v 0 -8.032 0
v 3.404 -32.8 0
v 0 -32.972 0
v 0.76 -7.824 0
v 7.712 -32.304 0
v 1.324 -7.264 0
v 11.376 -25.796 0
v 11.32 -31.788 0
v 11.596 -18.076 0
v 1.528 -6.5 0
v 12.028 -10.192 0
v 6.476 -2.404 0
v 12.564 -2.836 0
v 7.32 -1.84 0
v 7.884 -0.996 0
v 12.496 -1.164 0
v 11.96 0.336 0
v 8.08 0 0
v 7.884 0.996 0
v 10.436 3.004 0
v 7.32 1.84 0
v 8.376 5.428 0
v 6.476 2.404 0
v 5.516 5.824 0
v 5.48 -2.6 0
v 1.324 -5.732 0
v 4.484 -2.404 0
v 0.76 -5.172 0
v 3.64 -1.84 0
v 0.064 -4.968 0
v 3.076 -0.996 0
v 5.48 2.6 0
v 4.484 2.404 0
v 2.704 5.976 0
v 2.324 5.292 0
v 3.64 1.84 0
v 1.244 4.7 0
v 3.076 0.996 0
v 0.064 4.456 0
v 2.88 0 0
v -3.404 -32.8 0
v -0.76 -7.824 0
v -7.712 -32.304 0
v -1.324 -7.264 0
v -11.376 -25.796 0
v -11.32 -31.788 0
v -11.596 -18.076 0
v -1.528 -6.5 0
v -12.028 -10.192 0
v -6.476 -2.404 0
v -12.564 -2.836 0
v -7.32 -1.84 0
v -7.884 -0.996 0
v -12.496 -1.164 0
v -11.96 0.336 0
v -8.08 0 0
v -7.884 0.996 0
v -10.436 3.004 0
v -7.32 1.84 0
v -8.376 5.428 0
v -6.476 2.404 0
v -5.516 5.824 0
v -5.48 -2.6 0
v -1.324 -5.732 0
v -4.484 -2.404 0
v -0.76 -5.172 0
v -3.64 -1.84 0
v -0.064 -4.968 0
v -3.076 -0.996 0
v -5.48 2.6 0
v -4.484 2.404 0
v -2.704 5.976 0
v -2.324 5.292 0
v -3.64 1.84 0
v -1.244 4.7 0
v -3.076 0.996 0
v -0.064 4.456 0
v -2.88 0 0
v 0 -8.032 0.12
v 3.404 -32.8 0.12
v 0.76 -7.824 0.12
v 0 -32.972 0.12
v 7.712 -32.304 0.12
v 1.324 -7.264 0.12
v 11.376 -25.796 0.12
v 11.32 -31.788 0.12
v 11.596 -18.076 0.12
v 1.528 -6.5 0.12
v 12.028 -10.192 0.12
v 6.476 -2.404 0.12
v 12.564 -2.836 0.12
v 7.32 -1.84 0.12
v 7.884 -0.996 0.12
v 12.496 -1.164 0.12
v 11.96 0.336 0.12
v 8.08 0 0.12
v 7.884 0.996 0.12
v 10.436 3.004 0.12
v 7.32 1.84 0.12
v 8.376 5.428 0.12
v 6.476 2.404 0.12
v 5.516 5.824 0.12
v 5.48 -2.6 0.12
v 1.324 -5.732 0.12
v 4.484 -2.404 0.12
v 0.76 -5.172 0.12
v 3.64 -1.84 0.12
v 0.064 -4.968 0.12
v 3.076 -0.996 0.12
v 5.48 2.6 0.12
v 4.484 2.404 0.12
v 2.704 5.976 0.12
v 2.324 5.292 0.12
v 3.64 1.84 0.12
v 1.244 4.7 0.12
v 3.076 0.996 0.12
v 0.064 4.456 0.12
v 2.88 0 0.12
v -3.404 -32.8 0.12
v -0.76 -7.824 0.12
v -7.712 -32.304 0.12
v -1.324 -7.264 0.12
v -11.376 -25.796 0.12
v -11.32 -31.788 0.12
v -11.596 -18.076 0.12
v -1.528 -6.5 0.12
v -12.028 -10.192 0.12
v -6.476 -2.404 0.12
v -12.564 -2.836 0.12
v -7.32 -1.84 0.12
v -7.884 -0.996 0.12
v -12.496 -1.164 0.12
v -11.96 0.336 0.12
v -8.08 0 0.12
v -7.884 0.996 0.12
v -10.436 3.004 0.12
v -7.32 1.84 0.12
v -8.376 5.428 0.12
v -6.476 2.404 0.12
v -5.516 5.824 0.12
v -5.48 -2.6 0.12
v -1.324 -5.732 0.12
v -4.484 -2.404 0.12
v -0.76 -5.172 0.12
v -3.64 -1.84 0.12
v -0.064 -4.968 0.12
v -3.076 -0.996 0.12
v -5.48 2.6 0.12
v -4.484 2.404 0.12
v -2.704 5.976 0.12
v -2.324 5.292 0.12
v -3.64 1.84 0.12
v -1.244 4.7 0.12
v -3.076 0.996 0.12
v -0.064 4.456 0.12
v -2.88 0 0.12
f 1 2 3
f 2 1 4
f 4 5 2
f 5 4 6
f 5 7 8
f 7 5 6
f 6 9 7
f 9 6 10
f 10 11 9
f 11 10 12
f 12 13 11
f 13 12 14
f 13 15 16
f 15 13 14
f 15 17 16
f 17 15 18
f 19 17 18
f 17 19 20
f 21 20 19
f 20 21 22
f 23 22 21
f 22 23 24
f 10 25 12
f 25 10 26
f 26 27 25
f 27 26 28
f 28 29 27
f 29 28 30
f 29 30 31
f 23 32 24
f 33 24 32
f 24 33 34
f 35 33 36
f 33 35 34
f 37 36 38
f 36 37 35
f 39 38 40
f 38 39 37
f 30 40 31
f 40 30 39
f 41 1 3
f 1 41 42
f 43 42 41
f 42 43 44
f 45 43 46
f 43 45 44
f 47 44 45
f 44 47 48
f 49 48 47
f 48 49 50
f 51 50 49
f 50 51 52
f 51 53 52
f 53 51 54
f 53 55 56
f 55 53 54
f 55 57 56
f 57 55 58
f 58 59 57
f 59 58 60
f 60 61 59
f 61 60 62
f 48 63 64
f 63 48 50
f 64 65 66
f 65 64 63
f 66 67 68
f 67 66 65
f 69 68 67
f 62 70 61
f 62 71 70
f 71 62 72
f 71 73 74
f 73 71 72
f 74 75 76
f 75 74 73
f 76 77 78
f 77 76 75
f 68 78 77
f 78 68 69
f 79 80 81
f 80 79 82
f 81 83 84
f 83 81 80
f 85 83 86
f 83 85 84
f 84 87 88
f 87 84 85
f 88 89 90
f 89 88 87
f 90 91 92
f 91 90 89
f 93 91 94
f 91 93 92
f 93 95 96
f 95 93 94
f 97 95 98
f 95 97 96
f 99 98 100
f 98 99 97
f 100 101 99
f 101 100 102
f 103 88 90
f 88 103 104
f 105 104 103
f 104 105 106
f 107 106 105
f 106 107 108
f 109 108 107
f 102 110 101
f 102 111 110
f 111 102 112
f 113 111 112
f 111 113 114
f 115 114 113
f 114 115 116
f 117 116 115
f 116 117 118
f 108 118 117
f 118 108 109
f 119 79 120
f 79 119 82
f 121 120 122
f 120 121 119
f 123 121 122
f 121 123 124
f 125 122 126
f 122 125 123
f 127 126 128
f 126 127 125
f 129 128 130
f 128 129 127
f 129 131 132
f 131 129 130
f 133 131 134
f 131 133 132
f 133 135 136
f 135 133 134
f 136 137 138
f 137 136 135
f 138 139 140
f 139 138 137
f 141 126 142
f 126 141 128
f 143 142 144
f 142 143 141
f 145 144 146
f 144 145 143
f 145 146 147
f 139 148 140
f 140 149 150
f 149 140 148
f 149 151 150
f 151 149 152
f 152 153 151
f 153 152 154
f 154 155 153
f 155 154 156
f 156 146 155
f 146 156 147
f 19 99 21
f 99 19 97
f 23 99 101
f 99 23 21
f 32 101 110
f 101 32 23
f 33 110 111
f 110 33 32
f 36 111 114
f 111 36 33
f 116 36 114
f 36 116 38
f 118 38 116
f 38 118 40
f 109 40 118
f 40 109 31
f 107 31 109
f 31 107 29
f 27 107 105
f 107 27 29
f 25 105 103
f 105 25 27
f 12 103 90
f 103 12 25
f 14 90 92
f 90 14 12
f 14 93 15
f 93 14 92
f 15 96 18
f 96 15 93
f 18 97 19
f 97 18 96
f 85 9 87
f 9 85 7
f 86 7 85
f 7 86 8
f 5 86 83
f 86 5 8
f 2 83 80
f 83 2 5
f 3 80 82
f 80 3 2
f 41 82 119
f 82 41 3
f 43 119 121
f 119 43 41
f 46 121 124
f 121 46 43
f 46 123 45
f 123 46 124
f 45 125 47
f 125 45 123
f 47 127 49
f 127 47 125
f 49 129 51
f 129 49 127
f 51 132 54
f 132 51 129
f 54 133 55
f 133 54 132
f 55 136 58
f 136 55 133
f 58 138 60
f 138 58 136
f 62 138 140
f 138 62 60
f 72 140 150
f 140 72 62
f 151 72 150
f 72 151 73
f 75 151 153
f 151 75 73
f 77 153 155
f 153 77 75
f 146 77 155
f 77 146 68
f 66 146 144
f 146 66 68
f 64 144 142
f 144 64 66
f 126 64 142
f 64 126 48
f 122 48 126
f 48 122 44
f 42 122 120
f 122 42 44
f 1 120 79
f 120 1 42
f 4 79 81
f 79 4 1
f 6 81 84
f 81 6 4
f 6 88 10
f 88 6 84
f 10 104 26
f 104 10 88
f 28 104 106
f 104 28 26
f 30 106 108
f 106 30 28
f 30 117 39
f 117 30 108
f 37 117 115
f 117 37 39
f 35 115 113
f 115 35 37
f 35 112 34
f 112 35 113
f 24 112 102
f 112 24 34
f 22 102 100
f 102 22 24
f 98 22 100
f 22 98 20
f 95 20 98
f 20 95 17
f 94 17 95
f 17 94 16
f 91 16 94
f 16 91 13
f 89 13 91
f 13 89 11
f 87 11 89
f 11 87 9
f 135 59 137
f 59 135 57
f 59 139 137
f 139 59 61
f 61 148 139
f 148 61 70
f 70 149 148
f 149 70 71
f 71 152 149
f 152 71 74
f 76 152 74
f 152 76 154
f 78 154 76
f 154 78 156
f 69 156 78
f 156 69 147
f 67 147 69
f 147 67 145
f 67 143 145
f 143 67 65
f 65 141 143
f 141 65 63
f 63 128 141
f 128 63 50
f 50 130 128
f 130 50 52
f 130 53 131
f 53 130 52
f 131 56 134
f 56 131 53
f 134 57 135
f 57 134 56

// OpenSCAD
// file: s/65384s01.scad
use <../../lib.scad>
function ldraw_lib__s__65384s01() = [
// 0 ~Minifig Cape Cloth with Straight Side Surface Half
// 0 Name: s\65384s01.dat
// 0 Author: Philippe Hurbain [Philo]
// 0 !LDRAW_ORG Subpart UPDATE 2023-04
// 0 !LICENSE Licensed under CC BY 4.0 : see CAreadme.txt
// 
// 0 BFC CERTIFY CCW
  [0,"BFC","CERTIFY"],
  [0,"BFC","CCW"],
// 
// 0 !HISTORY 2023-08-25 [OrionP] Official Update 2023-04
// 
// 
// 2 24 20.2 0 0 19.71 0 2.49
  [2,24,20.2,0,0,19.71,0,2.49],
// 2 24 19.71 0 2.49 18.3 0 4.6
  [2,24,19.71,0,2.49,18.3,0,4.6],
// 2 24 18.3 0 4.6 16.19 0 6.01
  [2,24,18.3,0,4.6,16.19,0,6.01],
// 2 24 16.19 0 6.01 13.7 0 6.5
  [2,24,16.19,0,6.01,13.7,0,6.5],
// 2 24 13.7 0 6.5 11.21 0 6.01
  [2,24,13.7,0,6.5,11.21,0,6.01],
// 2 24 11.21 0 6.01 9.1 0 4.6
  [2,24,11.21,0,6.01,9.1,0,4.6],
// 2 24 9.1 0 4.6 7.69 0 2.49
  [2,24,9.1,0,4.6,7.69,0,2.49],
// 2 24 7.69 0 2.49 7.2 0 0
  [2,24,7.69,0,2.49,7.2,0,0],
// 2 24 7.2 0 0 7.69 0 -2.49
  [2,24,7.2,0,0,7.69,0,-2.49],
// 2 24 7.69 0 -2.49 9.1 0 -4.6
  [2,24,7.69,0,-2.49,9.1,0,-4.6],
// 2 24 9.1 0 -4.6 11.21 0 -6.01
  [2,24,9.1,0,-4.6,11.21,0,-6.01],
// 2 24 11.21 0 -6.01 13.7 0 -6.5
  [2,24,11.21,0,-6.01,13.7,0,-6.5],
// 2 24 13.7 0 -6.5 16.19 0 -6.01
  [2,24,13.7,0,-6.5,16.19,0,-6.01],
// 2 24 16.19 0 -6.01 18.3 0 -4.6
  [2,24,16.19,0,-6.01,18.3,0,-4.6],
// 2 24 18.3 0 -4.6 19.71 0 -2.49
  [2,24,18.3,0,-4.6,19.71,0,-2.49],
// 2 24 19.71 0 -2.49 20.2 0 0
  [2,24,19.71,0,-2.49,20.2,0,0],
// 2 24 30.07 0 -25.48 28.99 0 -45.19
  [2,24,30.07,0,-25.48,28.99,0,-45.19],
// 2 24 3.11 0 11.75 5.81 0 13.23
  [2,24,3.11,0,11.75,5.81,0,13.23],
// 2 24 5.81 0 13.23 6.76 0 14.94
  [2,24,5.81,0,13.23,6.76,0,14.94],
// 2 24 6.76 0 14.94 13.79 0 14.56
  [2,24,6.76,0,14.94,13.79,0,14.56],
// 2 24 13.79 0 14.56 20.94 0 13.57
  [2,24,13.79,0,14.56,20.94,0,13.57],
// 2 24 20.94 0 13.57 26.09 0 7.51
  [2,24,20.94,0,13.57,26.09,0,7.51],
// 2 24 26.09 0 7.51 29.9 0 0.84
  [2,24,26.09,0,7.51,29.9,0,0.84],
// 2 24 29.9 0 0.84 31.24 0 -2.91
  [2,24,29.9,0,0.84,31.24,0,-2.91],
// 2 24 31.24 0 -2.91 31.41 0 -7.09
  [2,24,31.24,0,-2.91,31.41,0,-7.09],
// 2 24 31.41 0 -7.09 30.07 0 -25.48
  [2,24,31.41,0,-7.09,30.07,0,-25.48],
// 2 24 28.99 0 -45.19 28.44 0 -64.49
  [2,24,28.99,0,-45.19,28.44,0,-64.49],
// 2 24 28.44 0 -64.49 28.3 0 -79.47
  [2,24,28.44,0,-64.49,28.3,0,-79.47],
// 2 24 28.3 0 -79.47 19.28 0 -80.76
  [2,24,28.3,0,-79.47,19.28,0,-80.76],
// 2 24 19.28 0 -80.76 8.51 0 -82
  [2,24,19.28,0,-80.76,8.51,0,-82],
// 2 24 8.51 0 -82 0 0 -82.43
  [2,24,8.51,0,-82,0,0,-82.43],
// 2 24 1.9 0 -12.93 0.16 0 -12.42
  [2,24,1.9,0,-12.93,0.16,0,-12.42],
// 2 24 3.31 0 -14.33 1.9 0 -12.93
  [2,24,3.31,0,-14.33,1.9,0,-12.93],
// 2 24 3.82 0 -16.25 3.31 0 -14.33
  [2,24,3.82,0,-16.25,3.31,0,-14.33],
// 2 24 3.31 0 -18.16 3.82 0 -16.25
  [2,24,3.31,0,-18.16,3.82,0,-16.25],
// 2 24 1.9 0 -19.56 3.31 0 -18.16
  [2,24,1.9,0,-19.56,3.31,0,-18.16],
// 2 24 0 0 -20.08 1.9 0 -19.56
  [2,24,0,0,-20.08,1.9,0,-19.56],
// 2 24 0.16 0 -12.42 0.16 0 11.14
  [2,24,0.16,0,-12.42,0.16,0,11.14],
// 2 24 0.16 0 11.14 3.11 0 11.75
  [2,24,0.16,0,11.14,3.11,0,11.75],
// 4 16 1.9 0 -19.56 0 0 -20.08 0 0 -82.43 8.51 0 -82
  [4,16,1.9,0,-19.56,0,0,-20.08,0,0,-82.43,8.51,0,-82],
// 4 16 3.31 0 -18.16 1.9 0 -19.56 8.51 0 -82 19.28 0 -80.76
  [4,16,3.31,0,-18.16,1.9,0,-19.56,8.51,0,-82,19.28,0,-80.76],
// 4 16 3.31 0 -18.16 19.28 0 -80.76 28.3 0 -79.47 28.44 0 -64.49
  [4,16,3.31,0,-18.16,19.28,0,-80.76,28.3,0,-79.47,28.44,0,-64.49],
// 4 16 3.31 0 -18.16 28.44 0 -64.49 28.99 0 -45.19 3.82 0 -16.25
  [4,16,3.31,0,-18.16,28.44,0,-64.49,28.99,0,-45.19,3.82,0,-16.25],
// 4 16 28.99 0 -45.19 30.07 0 -25.48 16.19 0 -6.01 3.82 0 -16.25
  [4,16,28.99,0,-45.19,30.07,0,-25.48,16.19,0,-6.01,3.82,0,-16.25],
// 4 16 16.19 0 -6.01 30.07 0 -25.48 31.41 0 -7.09 18.3 0 -4.6
  [4,16,16.19,0,-6.01,30.07,0,-25.48,31.41,0,-7.09,18.3,0,-4.6],
// 4 16 31.24 0 -2.91 19.71 0 -2.49 18.3 0 -4.6 31.41 0 -7.09
  [4,16,31.24,0,-2.91,19.71,0,-2.49,18.3,0,-4.6,31.41,0,-7.09],
// 4 16 20.2 0 0 19.71 0 -2.49 31.24 0 -2.91 29.9 0 0.84
  [4,16,20.2,0,0,19.71,0,-2.49,31.24,0,-2.91,29.9,0,0.84],
// 4 16 19.71 0 2.49 20.2 0 0 29.9 0 0.84 26.09 0 7.51
  [4,16,19.71,0,2.49,20.2,0,0,29.9,0,0.84,26.09,0,7.51],
// 4 16 18.3 0 4.6 19.71 0 2.49 26.09 0 7.51 20.94 0 13.57
  [4,16,18.3,0,4.6,19.71,0,2.49,26.09,0,7.51,20.94,0,13.57],
// 4 16 16.19 0 6.01 18.3 0 4.6 20.94 0 13.57 13.79 0 14.56
  [4,16,16.19,0,6.01,18.3,0,4.6,20.94,0,13.57,13.79,0,14.56],
// 4 16 16.19 0 -6.01 13.7 0 -6.5 3.31 0 -14.33 3.82 0 -16.25
  [4,16,16.19,0,-6.01,13.7,0,-6.5,3.31,0,-14.33,3.82,0,-16.25],
// 4 16 3.31 0 -14.33 13.7 0 -6.5 11.21 0 -6.01 1.9 0 -12.93
  [4,16,3.31,0,-14.33,13.7,0,-6.5,11.21,0,-6.01,1.9,0,-12.93],
// 4 16 1.9 0 -12.93 11.21 0 -6.01 9.1 0 -4.6 0.16 0 -12.42
  [4,16,1.9,0,-12.93,11.21,0,-6.01,9.1,0,-4.6,0.16,0,-12.42],
// 3 16 7.69 0 -2.49 0.16 0 -12.42 9.1 0 -4.6
  [3,16,7.69,0,-2.49,0.16,0,-12.42,9.1,0,-4.6],
// 3 16 13.79 0 14.56 13.7 0 6.5 16.19 0 6.01
  [3,16,13.79,0,14.56,13.7,0,6.5,16.19,0,6.01],
// 4 16 11.21 0 6.01 13.7 0 6.5 13.79 0 14.56 6.76 0 14.94
  [4,16,11.21,0,6.01,13.7,0,6.5,13.79,0,14.56,6.76,0,14.94],
// 4 16 11.21 0 6.01 6.76 0 14.94 5.81 0 13.23 9.1 0 4.6
  [4,16,11.21,0,6.01,6.76,0,14.94,5.81,0,13.23,9.1,0,4.6],
// 4 16 9.1 0 4.6 5.81 0 13.23 3.11 0 11.75 7.69 0 2.49
  [4,16,9.1,0,4.6,5.81,0,13.23,3.11,0,11.75,7.69,0,2.49],
// 4 16 7.69 0 2.49 3.11 0 11.75 0.16 0 11.14 7.2 0 0
  [4,16,7.69,0,2.49,3.11,0,11.75,0.16,0,11.14,7.2,0,0],
// 4 16 7.2 0 0 0.16 0 11.14 0.16 0 -12.42 7.69 0 -2.49
  [4,16,7.2,0,0,0.16,0,11.14,0.16,0,-12.42,7.69,0,-2.49],
];
module ldraw_lib__s__65384s01(step=0, col=false, unit=2/5, alt=false, line=0.2, solid=!$preview)
    makepoly(ldraw_lib__s__65384s01(), step=step, col=col, unit=unit, alt=alt, line=line, solid=solid);
ldraw_lib__s__65384s01(line=0.2);
// file: ../p/rect2p.scad
use <../lib.scad>
function ldraw_lib__rect2p() = [
// 0 Rectangle with 2 Parallel Edges
// 0 Name: rect2p.dat
// 0 Author: Donald Sutter [technog]
// 0 !LDRAW_ORG Primitive UPDATE 2010-01
// 0 !LICENSE Licensed under CC BY 4.0 : see CAreadme.txt
// 
// 0 BFC CERTIFY CCW
  [0,"BFC","CERTIFY"],
  [0,"BFC","CCW"],
// 
// 0 !HISTORY 2003-08-01 [PTadmin] Official Update 2003-02
// 0 !HISTORY 2007-06-24 [PTadmin] Header formatted for Contributor Agreement
// 0 !HISTORY 2008-07-01 [PTadmin] Official Update 2008-01
// 0 !HISTORY 2010-01-17 [mikeheide] changed winding to CCW
// 0 !HISTORY 2010-04-05 [PTadmin] Official Update 2010-01
// 
// 
// 2 24 1 0 1 -1 0 1
  [2,24,1,0,1,-1,0,1],
// 2 24 -1 0 -1 1 0 -1
  [2,24,-1,0,-1,1,0,-1],
// 4 16 -1 0 1 -1 0 -1 1 0 -1 1 0 1
  [4,16,-1,0,1,-1,0,-1,1,0,-1,1,0,1],
// 0
];
module ldraw_lib__rect2p(step=0, col=false, unit=2/5, alt=false, line=0.2, solid=!$preview)
    makepoly(ldraw_lib__rect2p(), step=step, col=col, unit=unit, alt=alt, line=line, solid=solid);
ldraw_lib__rect2p(line=0.2);
// main file
use <../lib.scad>
use <../p/rect2p.scad>
use <s/65384s01.scad>
function ldraw_lib__65384() = [
// 0 Minifig Cape Cloth with Straight Side
// 0 Name: 65384.dat
// 0 Author: Philippe Hurbain [Philo]
// 0 !LDRAW_ORG Part UPDATE 2023-04
// 0 !LICENSE Licensed under CC BY 4.0 : see CAreadme.txt
// 
// 0 BFC CERTIFY CCW
  [0,"BFC","CERTIFY"],
  [0,"BFC","CCW"],
// 
// 0 !CATEGORY Sheet Fabric
// 0 !KEYWORDS Cloak, Drape, Mandalorian, Neckwear, Poncho, Shawl, Star Wars, SW
// 
// 0 !HISTORY 2022-05-08 {LEGO Instructions App} Original part shape
// 0 !HISTORY 2022-05-08 [Philo] File preparation for LDraw Parts Tracker
// 0 !HISTORY 2023-08-25 [OrionP] Official Update 2023-04
// 
// 
// 1 16 0 0 0 1 0 0 0 -1 0 0 0 1 s\65384s01.dat
  [1,16,0,0,0,1,0,0,0,-1,0,0,0,1, ldraw_lib__s__65384s01()],
// 1 16 0 0 0 -1 0 0 0 -1 0 0 0 1 s\65384s01.dat
  [1,16,0,0,0,-1,0,0,0,-1,0,0,0,1, ldraw_lib__s__65384s01()],
// 1 16 0 -.3 0 1 0 0 0 1 0 0 0 1 s\65384s01.dat
  [1,16,0,-.3,0,1,0,0,0,1,0,0,0,1, ldraw_lib__s__65384s01()],
// 1 16 0 -.3 0 -1 0 0 0 1 0 0 0 1 s\65384s01.dat
  [1,16,0,-.3,0,-1,0,0,0,1,0,0,0,1, ldraw_lib__s__65384s01()],
// 
// 2 24 -20.94 -0.3 13.57 -20.94 0 13.57
  [2,24,-20.94,-0.3,13.57,-20.94,0,13.57],
// 2 24 28.3 -0.3 -79.47 28.3 0 -79.47
  [2,24,28.3,-0.3,-79.47,28.3,0,-79.47],
// 2 24 -6.76 -0.3 14.94 -6.76 0 14.94
  [2,24,-6.76,-0.3,14.94,-6.76,0,14.94],
// 2 24 6.76 -0.3 14.94 6.76 0 14.94
  [2,24,6.76,-0.3,14.94,6.76,0,14.94],
// 2 24 -28.3 -0.3 -79.47 -28.3 0 -79.47
  [2,24,-28.3,-0.3,-79.47,-28.3,0,-79.47],
// 2 24 20.94 -0.3 13.57 20.94 0 13.57
  [2,24,20.94,-0.3,13.57,20.94,0,13.57],
// 4 16 19.71 -0.3 2.49 18.3 -0.3 4.6 18.3 0 4.6 19.71 0 2.49
  [4,16,19.71,-0.3,2.49,18.3,-0.3,4.6,18.3,0,4.6,19.71,0,2.49],
// 4 16 18.3 -0.3 4.6 16.19 -0.3 6.01 16.19 0 6.01 18.3 0 4.6
  [4,16,18.3,-0.3,4.6,16.19,-0.3,6.01,16.19,0,6.01,18.3,0,4.6],
// 4 16 16.19 -0.3 6.01 13.7 -0.3 6.5 13.7 0 6.5 16.19 0 6.01
  [4,16,16.19,-0.3,6.01,13.7,-0.3,6.5,13.7,0,6.5,16.19,0,6.01],
// 4 16 13.7 -0.3 6.5 11.21 -0.3 6.01 11.21 0 6.01 13.7 0 6.5
  [4,16,13.7,-0.3,6.5,11.21,-0.3,6.01,11.21,0,6.01,13.7,0,6.5],
// 4 16 11.21 -0.3 6.01 9.1 -0.3 4.6 9.1 0 4.6 11.21 0 6.01
  [4,16,11.21,-0.3,6.01,9.1,-0.3,4.6,9.1,0,4.6,11.21,0,6.01],
// 4 16 9.1 -0.3 4.6 7.69 -0.3 2.49 7.69 0 2.49 9.1 0 4.6
  [4,16,9.1,-0.3,4.6,7.69,-0.3,2.49,7.69,0,2.49,9.1,0,4.6],
// 4 16 7.69 -0.3 2.49 7.2 -0.3 0 7.2 0 0 7.69 0 2.49
  [4,16,7.69,-0.3,2.49,7.2,-0.3,0,7.2,0,0,7.69,0,2.49],
// 4 16 7.2 -0.3 0 7.69 -0.3 -2.49 7.69 0 -2.49 7.2 0 0
  [4,16,7.2,-0.3,0,7.69,-0.3,-2.49,7.69,0,-2.49,7.2,0,0],
// 4 16 7.69 -0.3 -2.49 9.1 -0.3 -4.6 9.1 0 -4.6 7.69 0 -2.49
  [4,16,7.69,-0.3,-2.49,9.1,-0.3,-4.6,9.1,0,-4.6,7.69,0,-2.49],
// 4 16 9.1 -0.3 -4.6 11.21 -0.3 -6.01 11.21 0 -6.01 9.1 0 -4.6
  [4,16,9.1,-0.3,-4.6,11.21,-0.3,-6.01,11.21,0,-6.01,9.1,0,-4.6],
// 4 16 11.21 -0.3 -6.01 13.7 -0.3 -6.5 13.7 0 -6.5 11.21 0 -6.01
  [4,16,11.21,-0.3,-6.01,13.7,-0.3,-6.5,13.7,0,-6.5,11.21,0,-6.01],
// 4 16 13.7 -0.3 -6.5 16.19 -0.3 -6.01 16.19 0 -6.01 13.7 0 -6.5
  [4,16,13.7,-0.3,-6.5,16.19,-0.3,-6.01,16.19,0,-6.01,13.7,0,-6.5],
// 4 16 16.19 -0.3 -6.01 18.3 -0.3 -4.6 18.3 0 -4.6 16.19 0 -6.01
  [4,16,16.19,-0.3,-6.01,18.3,-0.3,-4.6,18.3,0,-4.6,16.19,0,-6.01],
// 4 16 18.3 -0.3 -4.6 19.71 -0.3 -2.49 19.71 0 -2.49 18.3 0 -4.6
  [4,16,18.3,-0.3,-4.6,19.71,-0.3,-2.49,19.71,0,-2.49,18.3,0,-4.6],
// 4 16 19.71 -0.3 -2.49 20.2 -0.3 0 20.2 0 0 19.71 0 -2.49
  [4,16,19.71,-0.3,-2.49,20.2,-0.3,0,20.2,0,0,19.71,0,-2.49],
// 4 16 20.2 -0.3 0 19.71 -0.3 2.49 19.71 0 2.49 20.2 0 0
  [4,16,20.2,-0.3,0,19.71,-0.3,2.49,19.71,0,2.49,20.2,0,0],
// 4 16 28.99 -0.3 -45.19 28.44 -0.3 -64.49 28.44 0 -64.49 28.99 0 -45.19
  [4,16,28.99,-0.3,-45.19,28.44,-0.3,-64.49,28.44,0,-64.49,28.99,0,-45.19],
// 4 16 28.44 -0.3 -64.49 28.3 -0.3 -79.47 28.3 0 -79.47 28.44 0 -64.49
  [4,16,28.44,-0.3,-64.49,28.3,-0.3,-79.47,28.3,0,-79.47,28.44,0,-64.49],
// 4 16 28.3 -0.3 -79.47 19.28 -0.3 -80.76 19.28 0 -80.76 28.3 0 -79.47
  [4,16,28.3,-0.3,-79.47,19.28,-0.3,-80.76,19.28,0,-80.76,28.3,0,-79.47],
// 4 16 19.28 -0.3 -80.76 8.51 -0.3 -82 8.51 0 -82 19.28 0 -80.76
  [4,16,19.28,-0.3,-80.76,8.51,-0.3,-82,8.51,0,-82,19.28,0,-80.76],
// 4 16 8.51 -0.3 -82 0 -0.3 -82.43 0 0 -82.43 8.51 0 -82
  [4,16,8.51,-0.3,-82,0,-0.3,-82.43,0,0,-82.43,8.51,0,-82],
// 4 16 0 -0.3 -82.43 -8.51 -0.3 -82 -8.51 0 -82 0 0 -82.43
  [4,16,0,-0.3,-82.43,-8.51,-0.3,-82,-8.51,0,-82,0,0,-82.43],
// 4 16 -8.51 -0.3 -82 -19.28 -0.3 -80.76 -19.28 0 -80.76 -8.51 0 -82
  [4,16,-8.51,-0.3,-82,-19.28,-0.3,-80.76,-19.28,0,-80.76,-8.51,0,-82],
// 4 16 -19.28 -0.3 -80.76 -28.3 -0.3 -79.47 -28.3 0 -79.47 -19.28 0 -80.76
  [4,16,-19.28,-0.3,-80.76,-28.3,-0.3,-79.47,-28.3,0,-79.47,-19.28,0,-80.76],
// 4 16 -28.3 -0.3 -79.47 -28.44 -0.3 -64.49 -28.44 0 -64.49 -28.3 0 -79.47
  [4,16,-28.3,-0.3,-79.47,-28.44,-0.3,-64.49,-28.44,0,-64.49,-28.3,0,-79.47],
// 4 16 -28.44 -0.3 -64.49 -28.99 -0.3 -45.19 -28.99 0 -45.19 -28.44 0 -64.49
  [4,16,-28.44,-0.3,-64.49,-28.99,-0.3,-45.19,-28.99,0,-45.19,-28.44,0,-64.49],
// 4 16 -28.99 -0.3 -45.19 -30.07 -0.3 -25.48 -30.07 0 -25.48 -28.99 0 -45.19
  [4,16,-28.99,-0.3,-45.19,-30.07,-0.3,-25.48,-30.07,0,-25.48,-28.99,0,-45.19],
// 4 16 -30.07 -0.3 -25.48 -31.41 -0.3 -7.09 -31.41 0 -7.09 -30.07 0 -25.48
  [4,16,-30.07,-0.3,-25.48,-31.41,-0.3,-7.09,-31.41,0,-7.09,-30.07,0,-25.48],
// 4 16 -31.41 -0.3 -7.09 -31.24 -0.3 -2.91 -31.24 0 -2.91 -31.41 0 -7.09
  [4,16,-31.41,-0.3,-7.09,-31.24,-0.3,-2.91,-31.24,0,-2.91,-31.41,0,-7.09],
// 4 16 -31.24 -0.3 -2.91 -29.9 -0.3 0.84 -29.9 0 0.84 -31.24 0 -2.91
  [4,16,-31.24,-0.3,-2.91,-29.9,-0.3,0.84,-29.9,0,0.84,-31.24,0,-2.91],
// 4 16 -29.9 -0.3 0.84 -26.09 -0.3 7.51 -26.09 0 7.51 -29.9 0 0.84
  [4,16,-29.9,-0.3,0.84,-26.09,-0.3,7.51,-26.09,0,7.51,-29.9,0,0.84],
// 4 16 -26.09 -0.3 7.51 -20.94 -0.3 13.57 -20.94 0 13.57 -26.09 0 7.51
  [4,16,-26.09,-0.3,7.51,-20.94,-0.3,13.57,-20.94,0,13.57,-26.09,0,7.51],
// 4 16 -20.94 -0.3 13.57 -13.79 -0.3 14.56 -13.79 0 14.56 -20.94 0 13.57
  [4,16,-20.94,-0.3,13.57,-13.79,-0.3,14.56,-13.79,0,14.56,-20.94,0,13.57],
// 4 16 -13.79 -0.3 14.56 -6.76 -0.3 14.94 -6.76 0 14.94 -13.79 0 14.56
  [4,16,-13.79,-0.3,14.56,-6.76,-0.3,14.94,-6.76,0,14.94,-13.79,0,14.56],
// 4 16 -6.76 -0.3 14.94 -5.81 -0.3 13.23 -5.81 0 13.23 -6.76 0 14.94
  [4,16,-6.76,-0.3,14.94,-5.81,-0.3,13.23,-5.81,0,13.23,-6.76,0,14.94],
// 4 16 -5.81 -0.3 13.23 -3.11 -0.3 11.75 -3.11 0 11.75 -5.81 0 13.23
  [4,16,-5.81,-0.3,13.23,-3.11,-0.3,11.75,-3.11,0,11.75,-5.81,0,13.23],
// 4 16 -3.11 -0.3 11.75 -0.16 -0.3 11.14 -0.16 0 11.14 -3.11 0 11.75
  [4,16,-3.11,-0.3,11.75,-0.16,-0.3,11.14,-0.16,0,11.14,-3.11,0,11.75],
// 1 16 -0.16 -0.15 -0.64 0 -1 0 0.15 0 0 0 0 11.78 rect2p.dat
  [1,16,-0.16,-0.15,-0.64,0,-1,0,0.15,0,0,0,0,11.78, ldraw_lib__rect2p()],
// 4 16 -0.16 -0.3 -12.42 -1.9 -0.3 -12.93 -1.9 0 -12.93 -0.16 0 -12.42
  [4,16,-0.16,-0.3,-12.42,-1.9,-0.3,-12.93,-1.9,0,-12.93,-0.16,0,-12.42],
// 4 16 -1.9 -0.3 -12.93 -3.31 -0.3 -14.33 -3.31 0 -14.33 -1.9 0 -12.93
  [4,16,-1.9,-0.3,-12.93,-3.31,-0.3,-14.33,-3.31,0,-14.33,-1.9,0,-12.93],
// 4 16 -3.31 -0.3 -14.33 -3.82 -0.3 -16.25 -3.82 0 -16.25 -3.31 0 -14.33
  [4,16,-3.31,-0.3,-14.33,-3.82,-0.3,-16.25,-3.82,0,-16.25,-3.31,0,-14.33],
// 4 16 -3.82 -0.3 -16.25 -3.31 -0.3 -18.16 -3.31 0 -18.16 -3.82 0 -16.25
  [4,16,-3.82,-0.3,-16.25,-3.31,-0.3,-18.16,-3.31,0,-18.16,-3.82,0,-16.25],
// 4 16 -3.31 -0.3 -18.16 -1.9 -0.3 -19.56 -1.9 0 -19.56 -3.31 0 -18.16
  [4,16,-3.31,-0.3,-18.16,-1.9,-0.3,-19.56,-1.9,0,-19.56,-3.31,0,-18.16],
// 4 16 -1.9 -0.3 -19.56 0 -0.3 -20.08 0 0 -20.08 -1.9 0 -19.56
  [4,16,-1.9,-0.3,-19.56,0,-0.3,-20.08,0,0,-20.08,-1.9,0,-19.56],
// 4 16 0 -0.3 -20.08 1.9 -0.3 -19.56 1.9 0 -19.56 0 0 -20.08
  [4,16,0,-0.3,-20.08,1.9,-0.3,-19.56,1.9,0,-19.56,0,0,-20.08],
// 4 16 1.9 -0.3 -19.56 3.31 -0.3 -18.16 3.31 0 -18.16 1.9 0 -19.56
  [4,16,1.9,-0.3,-19.56,3.31,-0.3,-18.16,3.31,0,-18.16,1.9,0,-19.56],
// 4 16 3.31 -0.3 -18.16 3.82 -0.3 -16.25 3.82 0 -16.25 3.31 0 -18.16
  [4,16,3.31,-0.3,-18.16,3.82,-0.3,-16.25,3.82,0,-16.25,3.31,0,-18.16],
// 4 16 3.82 -0.3 -16.25 3.31 -0.3 -14.33 3.31 0 -14.33 3.82 0 -16.25
  [4,16,3.82,-0.3,-16.25,3.31,-0.3,-14.33,3.31,0,-14.33,3.82,0,-16.25],
// 4 16 3.31 -0.3 -14.33 1.9 -0.3 -12.93 1.9 0 -12.93 3.31 0 -14.33
  [4,16,3.31,-0.3,-14.33,1.9,-0.3,-12.93,1.9,0,-12.93,3.31,0,-14.33],
// 4 16 1.9 -0.3 -12.93 0.16 -0.3 -12.42 0.16 0 -12.42 1.9 0 -12.93
  [4,16,1.9,-0.3,-12.93,0.16,-0.3,-12.42,0.16,0,-12.42,1.9,0,-12.93],
// 1 16 0.16 -0.15 -0.64 0 1 0 0.15 0 0 0 0 -11.78 rect2p.dat
  [1,16,0.16,-0.15,-0.64,0,1,0,0.15,0,0,0,0,-11.78, ldraw_lib__rect2p()],
// 4 16 0.16 -0.3 11.14 3.11 -0.3 11.75 3.11 0 11.75 0.16 0 11.14
  [4,16,0.16,-0.3,11.14,3.11,-0.3,11.75,3.11,0,11.75,0.16,0,11.14],
// 4 16 3.11 -0.3 11.75 5.81 -0.3 13.23 5.81 0 13.23 3.11 0 11.75
  [4,16,3.11,-0.3,11.75,5.81,-0.3,13.23,5.81,0,13.23,3.11,0,11.75],
// 4 16 5.81 -0.3 13.23 6.76 -0.3 14.94 6.76 0 14.94 5.81 0 13.23
  [4,16,5.81,-0.3,13.23,6.76,-0.3,14.94,6.76,0,14.94,5.81,0,13.23],
// 4 16 6.76 -0.3 14.94 13.79 -0.3 14.56 13.79 0 14.56 6.76 0 14.94
  [4,16,6.76,-0.3,14.94,13.79,-0.3,14.56,13.79,0,14.56,6.76,0,14.94],
// 4 16 13.79 -0.3 14.56 20.94 -0.3 13.57 20.94 0 13.57 13.79 0 14.56
  [4,16,13.79,-0.3,14.56,20.94,-0.3,13.57,20.94,0,13.57,13.79,0,14.56],
// 4 16 20.94 -0.3 13.57 26.09 -0.3 7.51 26.09 0 7.51 20.94 0 13.57
  [4,16,20.94,-0.3,13.57,26.09,-0.3,7.51,26.09,0,7.51,20.94,0,13.57],
// 4 16 26.09 -0.3 7.51 29.9 -0.3 0.84 29.9 0 0.84 26.09 0 7.51
  [4,16,26.09,-0.3,7.51,29.9,-0.3,0.84,29.9,0,0.84,26.09,0,7.51],
// 4 16 29.9 -0.3 0.84 31.24 -0.3 -2.91 31.24 0 -2.91 29.9 0 0.84
  [4,16,29.9,-0.3,0.84,31.24,-0.3,-2.91,31.24,0,-2.91,29.9,0,0.84],
// 4 16 31.24 -0.3 -2.91 31.41 -0.3 -7.09 31.41 0 -7.09 31.24 0 -2.91
  [4,16,31.24,-0.3,-2.91,31.41,-0.3,-7.09,31.41,0,-7.09,31.24,0,-2.91],
// 4 16 31.41 -0.3 -7.09 30.07 -0.3 -25.48 30.07 0 -25.48 31.41 0 -7.09
  [4,16,31.41,-0.3,-7.09,30.07,-0.3,-25.48,30.07,0,-25.48,31.41,0,-7.09],
// 4 16 30.07 -0.3 -25.48 28.99 -0.3 -45.19 28.99 0 -45.19 30.07 0 -25.48
  [4,16,30.07,-0.3,-25.48,28.99,-0.3,-45.19,28.99,0,-45.19,30.07,0,-25.48],
// 4 16 -18.3 0 4.6 -18.3 -0.3 4.6 -19.71 -0.3 2.49 -19.71 0 2.49
  [4,16,-18.3,0,4.6,-18.3,-0.3,4.6,-19.71,-0.3,2.49,-19.71,0,2.49],
// 4 16 -16.19 0 6.01 -16.19 -0.3 6.01 -18.3 -0.3 4.6 -18.3 0 4.6
  [4,16,-16.19,0,6.01,-16.19,-0.3,6.01,-18.3,-0.3,4.6,-18.3,0,4.6],
// 4 16 -13.7 0 6.5 -13.7 -0.3 6.5 -16.19 -0.3 6.01 -16.19 0 6.01
  [4,16,-13.7,0,6.5,-13.7,-0.3,6.5,-16.19,-0.3,6.01,-16.19,0,6.01],
// 4 16 -11.21 0 6.01 -11.21 -0.3 6.01 -13.7 -0.3 6.5 -13.7 0 6.5
  [4,16,-11.21,0,6.01,-11.21,-0.3,6.01,-13.7,-0.3,6.5,-13.7,0,6.5],
// 4 16 -9.1 0 4.6 -9.1 -0.3 4.6 -11.21 -0.3 6.01 -11.21 0 6.01
  [4,16,-9.1,0,4.6,-9.1,-0.3,4.6,-11.21,-0.3,6.01,-11.21,0,6.01],
// 4 16 -7.69 0 2.49 -7.69 -0.3 2.49 -9.1 -0.3 4.6 -9.1 0 4.6
  [4,16,-7.69,0,2.49,-7.69,-0.3,2.49,-9.1,-0.3,4.6,-9.1,0,4.6],
// 4 16 -7.2 0 0 -7.2 -0.3 0 -7.69 -0.3 2.49 -7.69 0 2.49
  [4,16,-7.2,0,0,-7.2,-0.3,0,-7.69,-0.3,2.49,-7.69,0,2.49],
// 4 16 -7.69 0 -2.49 -7.69 -0.3 -2.49 -7.2 -0.3 0 -7.2 0 0
  [4,16,-7.69,0,-2.49,-7.69,-0.3,-2.49,-7.2,-0.3,0,-7.2,0,0],
// 4 16 -9.1 0 -4.6 -9.1 -0.3 -4.6 -7.69 -0.3 -2.49 -7.69 0 -2.49
  [4,16,-9.1,0,-4.6,-9.1,-0.3,-4.6,-7.69,-0.3,-2.49,-7.69,0,-2.49],
// 4 16 -11.21 0 -6.01 -11.21 -0.3 -6.01 -9.1 -0.3 -4.6 -9.1 0 -4.6
  [4,16,-11.21,0,-6.01,-11.21,-0.3,-6.01,-9.1,-0.3,-4.6,-9.1,0,-4.6],
// 4 16 -13.7 0 -6.5 -13.7 -0.3 -6.5 -11.21 -0.3 -6.01 -11.21 0 -6.01
  [4,16,-13.7,0,-6.5,-13.7,-0.3,-6.5,-11.21,-0.3,-6.01,-11.21,0,-6.01],
// 4 16 -16.19 0 -6.01 -16.19 -0.3 -6.01 -13.7 -0.3 -6.5 -13.7 0 -6.5
  [4,16,-16.19,0,-6.01,-16.19,-0.3,-6.01,-13.7,-0.3,-6.5,-13.7,0,-6.5],
// 4 16 -18.3 0 -4.6 -18.3 -0.3 -4.6 -16.19 -0.3 -6.01 -16.19 0 -6.01
  [4,16,-18.3,0,-4.6,-18.3,-0.3,-4.6,-16.19,-0.3,-6.01,-16.19,0,-6.01],
// 4 16 -19.71 0 -2.49 -19.71 -0.3 -2.49 -18.3 -0.3 -4.6 -18.3 0 -4.6
  [4,16,-19.71,0,-2.49,-19.71,-0.3,-2.49,-18.3,-0.3,-4.6,-18.3,0,-4.6],
// 4 16 -20.2 0 0 -20.2 -0.3 0 -19.71 -0.3 -2.49 -19.71 0 -2.49
  [4,16,-20.2,0,0,-20.2,-0.3,0,-19.71,-0.3,-2.49,-19.71,0,-2.49],
// 4 16 -19.71 0 2.49 -19.71 -0.3 2.49 -20.2 -0.3 0 -20.2 0 0
  [4,16,-19.71,0,2.49,-19.71,-0.3,2.49,-20.2,-0.3,0,-20.2,0,0],
// 5 24 3.31 -0.3 -18.16 3.31 0 -18.16 3.82 -0.3 -16.25 1.9 -0.3 -19.56
  [5,24,3.31,-0.3,-18.16,3.31,0,-18.16,3.82,-0.3,-16.25,1.9,-0.3,-19.56],
// 5 24 3.82 -0.3 -16.25 3.82 0 -16.25 3.31 -0.3 -14.33 3.31 -0.3 -18.16
  [5,24,3.82,-0.3,-16.25,3.82,0,-16.25,3.31,-0.3,-14.33,3.31,-0.3,-18.16],
// 5 24 3.31 -0.3 -14.33 3.31 0 -14.33 1.9 -0.3 -12.93 3.82 -0.3 -16.25
  [5,24,3.31,-0.3,-14.33,3.31,0,-14.33,1.9,-0.3,-12.93,3.82,-0.3,-16.25],
// 5 24 1.9 -0.3 -12.93 1.9 0 -12.93 0.16 -0.3 -12.42 3.31 -0.3 -14.33
  [5,24,1.9,-0.3,-12.93,1.9,0,-12.93,0.16,-0.3,-12.42,3.31,-0.3,-14.33],
// 5 24 3.11 -0.3 11.75 3.11 0 11.75 5.81 -0.3 13.23 0.16 -0.3 11.14
  [5,24,3.11,-0.3,11.75,3.11,0,11.75,5.81,-0.3,13.23,0.16,-0.3,11.14],
// 5 24 5.81 -0.3 13.23 5.81 0 13.23 6.76 -0.3 14.94 3.11 -0.3 11.75
  [5,24,5.81,-0.3,13.23,5.81,0,13.23,6.76,-0.3,14.94,3.11,-0.3,11.75],
// 5 24 13.79 -0.3 14.56 13.79 0 14.56 20.94 -0.3 13.57 6.76 -0.3 14.94
  [5,24,13.79,-0.3,14.56,13.79,0,14.56,20.94,-0.3,13.57,6.76,-0.3,14.94],
// 5 24 26.09 -0.3 7.51 26.09 0 7.51 29.9 -0.3 0.84 20.94 -0.3 13.57
  [5,24,26.09,-0.3,7.51,26.09,0,7.51,29.9,-0.3,0.84,20.94,-0.3,13.57],
// 5 24 29.9 -0.3 0.84 29.9 0 0.84 31.24 -0.3 -2.91 26.09 -0.3 7.51
  [5,24,29.9,-0.3,0.84,29.9,0,0.84,31.24,-0.3,-2.91,26.09,-0.3,7.51],
// 5 24 31.24 -0.3 -2.91 31.24 0 -2.91 31.41 -0.3 -7.09 29.9 -0.3 0.84
  [5,24,31.24,-0.3,-2.91,31.24,0,-2.91,31.41,-0.3,-7.09,29.9,-0.3,0.84],
// 5 24 31.41 -0.3 -7.09 31.41 0 -7.09 30.07 -0.3 -25.48 31.24 -0.3 -2.91
  [5,24,31.41,-0.3,-7.09,31.41,0,-7.09,30.07,-0.3,-25.48,31.24,-0.3,-2.91],
// 5 24 30.07 -0.3 -25.48 30.07 0 -25.48 28.99 -0.3 -45.19 31.41 -0.3 -7.09
  [5,24,30.07,-0.3,-25.48,30.07,0,-25.48,28.99,-0.3,-45.19,31.41,-0.3,-7.09],
// 5 24 28.99 -0.3 -45.19 28.99 0 -45.19 30.07 -0.3 -25.48 28.44 -0.3 -64.49
  [5,24,28.99,-0.3,-45.19,28.99,0,-45.19,30.07,-0.3,-25.48,28.44,-0.3,-64.49],
// 5 24 -18.3 -0.3 4.6 -18.3 0 4.6 -16.19 -0.3 6.01 -19.71 -0.3 2.49
  [5,24,-18.3,-0.3,4.6,-18.3,0,4.6,-16.19,-0.3,6.01,-19.71,-0.3,2.49],
// 5 24 -16.19 -0.3 6.01 -16.19 0 6.01 -13.7 -0.3 6.5 -18.3 -0.3 4.6
  [5,24,-16.19,-0.3,6.01,-16.19,0,6.01,-13.7,-0.3,6.5,-18.3,-0.3,4.6],
// 5 24 -13.7 -0.3 6.5 -13.7 0 6.5 -11.21 -0.3 6.01 -16.19 -0.3 6.01
  [5,24,-13.7,-0.3,6.5,-13.7,0,6.5,-11.21,-0.3,6.01,-16.19,-0.3,6.01],
// 5 24 -11.21 -0.3 6.01 -11.21 0 6.01 -9.1 -0.3 4.6 -13.7 -0.3 6.5
  [5,24,-11.21,-0.3,6.01,-11.21,0,6.01,-9.1,-0.3,4.6,-13.7,-0.3,6.5],
// 5 24 -9.1 -0.3 4.6 -9.1 0 4.6 -7.69 -0.3 2.49 -11.21 -0.3 6.01
  [5,24,-9.1,-0.3,4.6,-9.1,0,4.6,-7.69,-0.3,2.49,-11.21,-0.3,6.01],
// 5 24 -7.69 -0.3 2.49 -7.69 0 2.49 -7.2 -0.3 0 -9.1 -0.3 4.6
  [5,24,-7.69,-0.3,2.49,-7.69,0,2.49,-7.2,-0.3,0,-9.1,-0.3,4.6],
// 5 24 -7.2 -0.3 0 -7.2 0 0 -7.69 -0.3 -2.49 -7.69 -0.3 2.49
  [5,24,-7.2,-0.3,0,-7.2,0,0,-7.69,-0.3,-2.49,-7.69,-0.3,2.49],
// 5 24 -7.69 -0.3 -2.49 -7.69 0 -2.49 -9.1 -0.3 -4.6 -7.2 -0.3 0
  [5,24,-7.69,-0.3,-2.49,-7.69,0,-2.49,-9.1,-0.3,-4.6,-7.2,-0.3,0],
// 5 24 -9.1 -0.3 -4.6 -9.1 0 -4.6 -11.21 -0.3 -6.01 -7.69 -0.3 -2.49
  [5,24,-9.1,-0.3,-4.6,-9.1,0,-4.6,-11.21,-0.3,-6.01,-7.69,-0.3,-2.49],
// 5 24 -11.21 -0.3 -6.01 -11.21 0 -6.01 -13.7 -0.3 -6.5 -9.1 -0.3 -4.6
  [5,24,-11.21,-0.3,-6.01,-11.21,0,-6.01,-13.7,-0.3,-6.5,-9.1,-0.3,-4.6],
// 5 24 -13.7 -0.3 -6.5 -13.7 0 -6.5 -16.19 -0.3 -6.01 -11.21 -0.3 -6.01
  [5,24,-13.7,-0.3,-6.5,-13.7,0,-6.5,-16.19,-0.3,-6.01,-11.21,-0.3,-6.01],
// 5 24 -16.19 -0.3 -6.01 -16.19 0 -6.01 -18.3 -0.3 -4.6 -13.7 -0.3 -6.5
  [5,24,-16.19,-0.3,-6.01,-16.19,0,-6.01,-18.3,-0.3,-4.6,-13.7,-0.3,-6.5],
// 5 24 -18.3 -0.3 -4.6 -18.3 0 -4.6 -19.71 -0.3 -2.49 -16.19 -0.3 -6.01
  [5,24,-18.3,-0.3,-4.6,-18.3,0,-4.6,-19.71,-0.3,-2.49,-16.19,-0.3,-6.01],
// 5 24 -19.71 -0.3 -2.49 -19.71 0 -2.49 -20.2 -0.3 0 -18.3 -0.3 -4.6
  [5,24,-19.71,-0.3,-2.49,-19.71,0,-2.49,-20.2,-0.3,0,-18.3,-0.3,-4.6],
// 5 24 -20.2 -0.3 0 -20.2 0 0 -19.71 -0.3 2.49 -19.71 -0.3 -2.49
  [5,24,-20.2,-0.3,0,-20.2,0,0,-19.71,-0.3,2.49,-19.71,-0.3,-2.49],
// 5 24 -19.71 -0.3 2.49 -19.71 0 2.49 -20.2 -0.3 0 -18.3 -0.3 4.6
  [5,24,-19.71,-0.3,2.49,-19.71,0,2.49,-20.2,-0.3,0,-18.3,-0.3,4.6],
// 5 24 18.3 -0.3 4.6 18.3 0 4.6 16.19 -0.3 6.01 19.71 -0.3 2.49
  [5,24,18.3,-0.3,4.6,18.3,0,4.6,16.19,-0.3,6.01,19.71,-0.3,2.49],
// 5 24 16.19 -0.3 6.01 16.19 0 6.01 13.7 -0.3 6.5 18.3 -0.3 4.6
  [5,24,16.19,-0.3,6.01,16.19,0,6.01,13.7,-0.3,6.5,18.3,-0.3,4.6],
// 5 24 13.7 -0.3 6.5 13.7 0 6.5 11.21 -0.3 6.01 16.19 -0.3 6.01
  [5,24,13.7,-0.3,6.5,13.7,0,6.5,11.21,-0.3,6.01,16.19,-0.3,6.01],
// 5 24 11.21 -0.3 6.01 11.21 0 6.01 9.1 -0.3 4.6 13.7 -0.3 6.5
  [5,24,11.21,-0.3,6.01,11.21,0,6.01,9.1,-0.3,4.6,13.7,-0.3,6.5],
// 5 24 9.1 -0.3 4.6 9.1 0 4.6 7.69 -0.3 2.49 11.21 -0.3 6.01
  [5,24,9.1,-0.3,4.6,9.1,0,4.6,7.69,-0.3,2.49,11.21,-0.3,6.01],
// 5 24 7.69 -0.3 2.49 7.69 0 2.49 7.2 -0.3 0 9.1 -0.3 4.6
  [5,24,7.69,-0.3,2.49,7.69,0,2.49,7.2,-0.3,0,9.1,-0.3,4.6],
// 5 24 7.2 -0.3 0 7.2 0 0 7.69 -0.3 -2.49 7.69 -0.3 2.49
  [5,24,7.2,-0.3,0,7.2,0,0,7.69,-0.3,-2.49,7.69,-0.3,2.49],
// 5 24 7.69 -0.3 -2.49 7.69 0 -2.49 9.1 -0.3 -4.6 7.2 -0.3 0
  [5,24,7.69,-0.3,-2.49,7.69,0,-2.49,9.1,-0.3,-4.6,7.2,-0.3,0],
// 5 24 9.1 -0.3 -4.6 9.1 0 -4.6 11.21 -0.3 -6.01 7.69 -0.3 -2.49
  [5,24,9.1,-0.3,-4.6,9.1,0,-4.6,11.21,-0.3,-6.01,7.69,-0.3,-2.49],
// 5 24 11.21 -0.3 -6.01 11.21 0 -6.01 13.7 -0.3 -6.5 9.1 -0.3 -4.6
  [5,24,11.21,-0.3,-6.01,11.21,0,-6.01,13.7,-0.3,-6.5,9.1,-0.3,-4.6],
// 5 24 13.7 -0.3 -6.5 13.7 0 -6.5 16.19 -0.3 -6.01 11.21 -0.3 -6.01
  [5,24,13.7,-0.3,-6.5,13.7,0,-6.5,16.19,-0.3,-6.01,11.21,-0.3,-6.01],
// 5 24 16.19 -0.3 -6.01 16.19 0 -6.01 18.3 -0.3 -4.6 13.7 -0.3 -6.5
  [5,24,16.19,-0.3,-6.01,16.19,0,-6.01,18.3,-0.3,-4.6,13.7,-0.3,-6.5],
// 5 24 18.3 -0.3 -4.6 18.3 0 -4.6 19.71 -0.3 -2.49 16.19 -0.3 -6.01
  [5,24,18.3,-0.3,-4.6,18.3,0,-4.6,19.71,-0.3,-2.49,16.19,-0.3,-6.01],
// 5 24 19.71 -0.3 -2.49 19.71 0 -2.49 20.2 -0.3 0 18.3 -0.3 -4.6
  [5,24,19.71,-0.3,-2.49,19.71,0,-2.49,20.2,-0.3,0,18.3,-0.3,-4.6],
// 5 24 20.2 -0.3 0 20.2 0 0 19.71 -0.3 2.49 19.71 -0.3 -2.49
  [5,24,20.2,-0.3,0,20.2,0,0,19.71,-0.3,2.49,19.71,-0.3,-2.49],
// 5 24 19.71 -0.3 2.49 19.71 0 2.49 20.2 -0.3 0 18.3 -0.3 4.6
  [5,24,19.71,-0.3,2.49,19.71,0,2.49,20.2,-0.3,0,18.3,-0.3,4.6],
// 5 24 28.44 -0.3 -64.49 28.44 0 -64.49 28.3 -0.3 -79.47 28.99 -0.3 -45.19
  [5,24,28.44,-0.3,-64.49,28.44,0,-64.49,28.3,-0.3,-79.47,28.99,-0.3,-45.19],
// 5 24 19.28 -0.3 -80.76 19.28 0 -80.76 8.51 -0.3 -82 28.3 -0.3 -79.47
  [5,24,19.28,-0.3,-80.76,19.28,0,-80.76,8.51,-0.3,-82,28.3,-0.3,-79.47],
// 5 24 8.51 -0.3 -82 8.51 0 -82 0 -0.3 -82.43 19.28 -0.3 -80.76
  [5,24,8.51,-0.3,-82,8.51,0,-82,0,-0.3,-82.43,19.28,-0.3,-80.76],
// 5 24 0 -0.3 -82.43 0 0 -82.43 -8.51 -0.3 -82 8.51 -0.3 -82
  [5,24,0,-0.3,-82.43,0,0,-82.43,-8.51,-0.3,-82,8.51,-0.3,-82],
// 5 24 -8.51 -0.3 -82 -8.51 0 -82 -19.28 -0.3 -80.76 0 -0.3 -82.43
  [5,24,-8.51,-0.3,-82,-8.51,0,-82,-19.28,-0.3,-80.76,0,-0.3,-82.43],
// 5 24 -19.28 -0.3 -80.76 -19.28 0 -80.76 -28.3 -0.3 -79.47 -8.51 -0.3 -82
  [5,24,-19.28,-0.3,-80.76,-19.28,0,-80.76,-28.3,-0.3,-79.47,-8.51,-0.3,-82],
// 5 24 -28.44 -0.3 -64.49 -28.44 0 -64.49 -28.99 -0.3 -45.19 -28.3 -0.3 -79.47
  [5,24,-28.44,-0.3,-64.49,-28.44,0,-64.49,-28.99,-0.3,-45.19,-28.3,-0.3,-79.47],
// 5 24 -28.99 -0.3 -45.19 -28.99 0 -45.19 -30.07 -0.3 -25.48 -28.44 -0.3 -64.49
  [5,24,-28.99,-0.3,-45.19,-28.99,0,-45.19,-30.07,-0.3,-25.48,-28.44,-0.3,-64.49],
// 5 24 -30.07 -0.3 -25.48 -30.07 0 -25.48 -31.41 -0.3 -7.09 -28.99 -0.3 -45.19
  [5,24,-30.07,-0.3,-25.48,-30.07,0,-25.48,-31.41,-0.3,-7.09,-28.99,-0.3,-45.19],
// 5 24 -31.41 -0.3 -7.09 -31.41 0 -7.09 -31.24 -0.3 -2.91 -30.07 -0.3 -25.48
  [5,24,-31.41,-0.3,-7.09,-31.41,0,-7.09,-31.24,-0.3,-2.91,-30.07,-0.3,-25.48],
// 5 24 -31.24 -0.3 -2.91 -31.24 0 -2.91 -29.9 -0.3 0.84 -31.41 -0.3 -7.09
  [5,24,-31.24,-0.3,-2.91,-31.24,0,-2.91,-29.9,-0.3,0.84,-31.41,-0.3,-7.09],
// 5 24 -29.9 -0.3 0.84 -29.9 0 0.84 -26.09 -0.3 7.51 -31.24 -0.3 -2.91
  [5,24,-29.9,-0.3,0.84,-29.9,0,0.84,-26.09,-0.3,7.51,-31.24,-0.3,-2.91],
// 5 24 -26.09 -0.3 7.51 -26.09 0 7.51 -20.94 -0.3 13.57 -29.9 -0.3 0.84
  [5,24,-26.09,-0.3,7.51,-26.09,0,7.51,-20.94,-0.3,13.57,-29.9,-0.3,0.84],
// 5 24 -13.79 -0.3 14.56 -13.79 0 14.56 -6.76 -0.3 14.94 -20.94 -0.3 13.57
  [5,24,-13.79,-0.3,14.56,-13.79,0,14.56,-6.76,-0.3,14.94,-20.94,-0.3,13.57],
// 5 24 -5.81 -0.3 13.23 -5.81 0 13.23 -3.11 -0.3 11.75 -6.76 -0.3 14.94
  [5,24,-5.81,-0.3,13.23,-5.81,0,13.23,-3.11,-0.3,11.75,-6.76,-0.3,14.94],
// 5 24 -3.11 -0.3 11.75 -3.11 0 11.75 -0.16 -0.3 11.14 -5.81 -0.3 13.23
  [5,24,-3.11,-0.3,11.75,-3.11,0,11.75,-0.16,-0.3,11.14,-5.81,-0.3,13.23],
// 5 24 -1.9 -0.3 -12.93 -1.9 0 -12.93 -3.31 -0.3 -14.33 -0.16 -0.3 -12.42
  [5,24,-1.9,-0.3,-12.93,-1.9,0,-12.93,-3.31,-0.3,-14.33,-0.16,-0.3,-12.42],
// 5 24 -3.31 -0.3 -14.33 -3.31 0 -14.33 -3.82 -0.3 -16.25 -1.9 -0.3 -12.93
  [5,24,-3.31,-0.3,-14.33,-3.31,0,-14.33,-3.82,-0.3,-16.25,-1.9,-0.3,-12.93],
// 5 24 -3.82 -0.3 -16.25 -3.82 0 -16.25 -3.31 -0.3 -18.16 -3.31 -0.3 -14.33
  [5,24,-3.82,-0.3,-16.25,-3.82,0,-16.25,-3.31,-0.3,-18.16,-3.31,-0.3,-14.33],
// 5 24 -3.31 -0.3 -18.16 -3.31 0 -18.16 -1.9 -0.3 -19.56 -3.82 -0.3 -16.25
  [5,24,-3.31,-0.3,-18.16,-3.31,0,-18.16,-1.9,-0.3,-19.56,-3.82,-0.3,-16.25],
// 5 24 -1.9 -0.3 -19.56 -1.9 0 -19.56 0 -0.3 -20.08 -3.31 -0.3 -18.16
  [5,24,-1.9,-0.3,-19.56,-1.9,0,-19.56,0,-0.3,-20.08,-3.31,-0.3,-18.16],
// 5 24 0 -0.3 -20.08 0 0 -20.08 1.9 -0.3 -19.56 -1.9 -0.3 -19.56
  [5,24,0,-0.3,-20.08,0,0,-20.08,1.9,-0.3,-19.56,-1.9,-0.3,-19.56],
// 5 24 1.9 -0.3 -19.56 1.9 0 -19.56 3.31 -0.3 -18.16 0 -0.3 -20.08
  [5,24,1.9,-0.3,-19.56,1.9,0,-19.56,3.31,-0.3,-18.16,0,-0.3,-20.08],
];
module ldraw_lib__65384(step=0, col=false, unit=2/5, alt=false, line=0.2, solid=!$preview)
    makepoly(ldraw_lib__65384(), step=step, col=col, unit=unit, alt=alt, line=line, solid=solid);
ldraw_lib__65384(line=0.2);
